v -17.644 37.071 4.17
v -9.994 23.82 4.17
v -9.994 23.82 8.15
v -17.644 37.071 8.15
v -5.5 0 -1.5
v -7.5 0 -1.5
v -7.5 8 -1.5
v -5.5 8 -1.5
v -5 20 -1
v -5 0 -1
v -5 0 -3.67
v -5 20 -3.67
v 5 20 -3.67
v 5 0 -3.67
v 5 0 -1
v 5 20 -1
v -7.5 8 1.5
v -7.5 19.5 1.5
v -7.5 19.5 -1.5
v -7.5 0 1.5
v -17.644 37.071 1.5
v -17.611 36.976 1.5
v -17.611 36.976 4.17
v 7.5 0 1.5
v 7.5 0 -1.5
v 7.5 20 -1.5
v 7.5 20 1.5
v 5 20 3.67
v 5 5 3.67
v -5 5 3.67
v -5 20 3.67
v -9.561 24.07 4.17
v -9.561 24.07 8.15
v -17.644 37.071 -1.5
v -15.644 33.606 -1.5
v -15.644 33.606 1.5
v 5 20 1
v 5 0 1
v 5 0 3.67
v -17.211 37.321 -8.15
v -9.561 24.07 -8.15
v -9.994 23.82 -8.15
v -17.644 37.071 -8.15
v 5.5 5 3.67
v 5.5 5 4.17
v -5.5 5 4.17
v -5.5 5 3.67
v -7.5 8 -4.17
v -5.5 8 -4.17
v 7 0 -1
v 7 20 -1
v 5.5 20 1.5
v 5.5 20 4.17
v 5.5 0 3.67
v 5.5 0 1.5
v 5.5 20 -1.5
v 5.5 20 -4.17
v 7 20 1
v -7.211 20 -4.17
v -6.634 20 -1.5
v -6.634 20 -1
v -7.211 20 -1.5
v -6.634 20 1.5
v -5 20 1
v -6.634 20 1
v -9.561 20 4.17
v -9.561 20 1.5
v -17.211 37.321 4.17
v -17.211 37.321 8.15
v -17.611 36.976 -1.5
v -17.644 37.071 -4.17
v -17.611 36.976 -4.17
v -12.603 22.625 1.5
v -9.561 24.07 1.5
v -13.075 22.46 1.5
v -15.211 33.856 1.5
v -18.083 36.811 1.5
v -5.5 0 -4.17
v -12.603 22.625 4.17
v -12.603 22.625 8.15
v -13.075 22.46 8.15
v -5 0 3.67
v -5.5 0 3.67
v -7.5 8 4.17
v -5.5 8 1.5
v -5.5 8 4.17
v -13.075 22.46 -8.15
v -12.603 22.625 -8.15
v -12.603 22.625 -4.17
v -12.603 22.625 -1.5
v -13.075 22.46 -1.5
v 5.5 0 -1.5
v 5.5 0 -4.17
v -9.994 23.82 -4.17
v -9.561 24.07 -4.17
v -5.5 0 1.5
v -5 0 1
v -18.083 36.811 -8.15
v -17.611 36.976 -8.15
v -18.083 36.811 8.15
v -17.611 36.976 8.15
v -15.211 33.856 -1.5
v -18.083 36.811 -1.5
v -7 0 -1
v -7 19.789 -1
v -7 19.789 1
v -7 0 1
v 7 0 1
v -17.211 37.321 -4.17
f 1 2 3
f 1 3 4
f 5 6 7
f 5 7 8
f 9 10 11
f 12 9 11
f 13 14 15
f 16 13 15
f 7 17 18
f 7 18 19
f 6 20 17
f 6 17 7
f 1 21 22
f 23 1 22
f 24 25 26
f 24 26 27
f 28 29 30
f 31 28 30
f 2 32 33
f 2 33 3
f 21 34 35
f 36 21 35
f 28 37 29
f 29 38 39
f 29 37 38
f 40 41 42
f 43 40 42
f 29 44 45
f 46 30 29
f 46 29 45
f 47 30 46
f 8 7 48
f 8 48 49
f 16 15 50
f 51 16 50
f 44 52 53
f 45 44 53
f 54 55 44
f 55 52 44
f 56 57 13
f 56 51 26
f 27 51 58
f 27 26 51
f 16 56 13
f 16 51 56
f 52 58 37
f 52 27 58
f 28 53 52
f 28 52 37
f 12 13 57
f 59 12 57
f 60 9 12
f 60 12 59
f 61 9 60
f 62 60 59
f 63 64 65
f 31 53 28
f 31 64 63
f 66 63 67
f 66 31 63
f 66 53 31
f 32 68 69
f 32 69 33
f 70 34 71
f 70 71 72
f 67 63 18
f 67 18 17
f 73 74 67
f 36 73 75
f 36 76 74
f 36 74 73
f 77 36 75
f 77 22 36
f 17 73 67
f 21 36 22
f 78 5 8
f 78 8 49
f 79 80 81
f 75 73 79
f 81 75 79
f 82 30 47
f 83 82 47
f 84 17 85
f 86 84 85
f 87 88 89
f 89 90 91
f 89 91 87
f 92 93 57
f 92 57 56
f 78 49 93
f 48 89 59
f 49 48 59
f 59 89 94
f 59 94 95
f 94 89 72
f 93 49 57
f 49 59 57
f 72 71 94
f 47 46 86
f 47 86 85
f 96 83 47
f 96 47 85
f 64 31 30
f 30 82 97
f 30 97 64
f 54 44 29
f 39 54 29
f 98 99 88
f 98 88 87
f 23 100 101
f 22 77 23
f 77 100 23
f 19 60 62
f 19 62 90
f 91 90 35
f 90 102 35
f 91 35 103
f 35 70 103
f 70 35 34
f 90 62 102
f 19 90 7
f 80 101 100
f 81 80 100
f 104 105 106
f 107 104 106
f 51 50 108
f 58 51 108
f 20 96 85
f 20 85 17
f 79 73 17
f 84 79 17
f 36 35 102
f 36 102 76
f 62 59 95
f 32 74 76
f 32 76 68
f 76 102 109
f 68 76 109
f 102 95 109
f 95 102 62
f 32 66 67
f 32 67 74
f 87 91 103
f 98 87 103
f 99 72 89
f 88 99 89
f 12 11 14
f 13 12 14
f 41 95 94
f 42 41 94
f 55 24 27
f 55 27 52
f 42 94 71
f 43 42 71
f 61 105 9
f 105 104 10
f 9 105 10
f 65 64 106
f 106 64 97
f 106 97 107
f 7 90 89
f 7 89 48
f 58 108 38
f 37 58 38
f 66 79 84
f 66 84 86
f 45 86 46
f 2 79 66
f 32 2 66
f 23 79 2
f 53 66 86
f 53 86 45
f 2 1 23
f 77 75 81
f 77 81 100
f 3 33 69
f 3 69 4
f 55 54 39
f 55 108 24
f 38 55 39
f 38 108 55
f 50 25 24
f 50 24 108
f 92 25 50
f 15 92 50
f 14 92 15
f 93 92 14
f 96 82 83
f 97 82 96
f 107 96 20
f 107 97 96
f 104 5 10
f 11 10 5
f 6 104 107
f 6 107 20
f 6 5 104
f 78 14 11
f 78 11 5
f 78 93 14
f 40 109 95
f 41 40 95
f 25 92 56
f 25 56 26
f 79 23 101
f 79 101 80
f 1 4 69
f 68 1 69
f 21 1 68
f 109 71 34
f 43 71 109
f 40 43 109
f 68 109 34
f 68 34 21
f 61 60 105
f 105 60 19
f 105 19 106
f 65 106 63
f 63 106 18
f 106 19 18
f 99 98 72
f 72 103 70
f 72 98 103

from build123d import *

# Parameters (mm, degrees)
AUFSATZ_LINEAR_AUSTRAGEN1_DEPTH  = 20
SCHNITT_LINEAR_AUSTRAGEN2_REACH  = 2.5
SKIZZE8_W                        = 11
SKIZZE8_H                        = 5
AUFSATZ_LINEAR_AUSTRAGEN3_DEPTH  = 8.34
SCHNITT_LINEAR_AUSTRAGEN3_REACH  = 19.821
SKIZZE12_W                       = 1.5
SKIZZE12_H                       = 2
AUFSATZ_LINEAR_AUSTRAGEN4_DEPTH  = 3.98
AUFSATZ_LINEAR_AUSTRAGEN5_DEPTH  = 2.67
AUFSATZ_LINEAR_AUSTRAGEN6_DEPTH  = 2.67
SCHNITT_LINEAR_AUSTRAGEN4_REACH  = 23.901
SKIZZE17_W                       = 3
SKIZZE17_H                       = 16.288675134
AUFSATZ_LINEAR_AUSTRAGEN15_DEPTH = 6.65
SCHNITT_LINEAR_AUSTRAGEN5_REACH  = 14.32


with BuildPart() as part:
    # Skizze1 → Aufsatz-Linear austragen1 (new body)
    with BuildSketch(Plane(origin=(0, 0, 0), x_dir=(1, 0, 0), z_dir=(0, 1, 0))):
        Polygon((5.5, -4.17), (-5.5, -4.17), (-5.5, -1.5), (-7.5, -1.5), (-7.5, 1.5), (-5.5, 1.5), (-5.5, 4.17), (5.5, 4.17), (5.5, 1.5), (7.5, 1.5), (7.5, -1.5), (5.5, -1.5), align=None)
        Polygon((-5, 1), (-5, 3.67), (5, 3.67), (5, 1), (7, 1), (7, -1), (5, -1), (5, -3.67), (-5, -3.67), (-5, -1), (-7, -1), (-7, 1), align=None, mode=Mode.SUBTRACT)
    extrude(amount=AUFSATZ_LINEAR_AUSTRAGEN1_DEPTH)

    # Skizze8 → Schnitt-Linear austragen2 (cut, up to next)
    with BuildSketch(Plane(origin=(0, 0, 3.67), x_dir=(-1, 0, 0), z_dir=(0, 0, -1)), mode=Mode.PRIVATE) as schnitt_linear_austragen2_sk1:
        with Locations((0, 2.5)):
            Rectangle(SKIZZE8_W, SKIZZE8_H)
    schnitt_linear_austragen2_tool1 = extrude(schnitt_linear_austragen2_sk1.sketch, amount=-SCHNITT_LINEAR_AUSTRAGEN2_REACH, mode=Mode.PRIVATE) & part.part
    add(schnitt_linear_austragen2_tool1.solids().sort_by_distance((0, 2.5, 3.67))[0], mode=Mode.SUBTRACT)

    # Skizze10 → Aufsatz-Linear austragen3 (add)
    with BuildSketch(Plane(origin=(0, 0, -4.17), x_dir=(-1, 0, 0), z_dir=(0, 0, -1))):
        Polygon((5.5, 20), (7.211324865, 20), (17.211324865, 37.320508076), (17.644337567, 37.070508076), (7.5, 19.5), (5.5, 19.5), align=None)
    extrude(amount=-AUFSATZ_LINEAR_AUSTRAGEN3_DEPTH)

    # Skizze12 → Schnitt-Linear austragen3 (cut, up to next)
    with BuildSketch(Plane.XZ.offset(-19.5), mode=Mode.PRIVATE) as schnitt_linear_austragen3_sk1:
        with Locations((-6.25, 0)):
            Rectangle(SKIZZE12_W, SKIZZE12_H)
    schnitt_linear_austragen3_tool1 = extrude(schnitt_linear_austragen3_sk1.sketch, amount=-SCHNITT_LINEAR_AUSTRAGEN3_REACH, mode=Mode.PRIVATE) & part.part
    add(schnitt_linear_austragen3_tool1.solids().sort_by_distance((-6.25, 19.5, 0))[0], mode=Mode.SUBTRACT)

    # Skizze13 → Aufsatz-Linear austragen4 (add)
    with BuildSketch(Plane(origin=(0, 0, -4.17), x_dir=(-1, 0, 0), z_dir=(0, 0, -1))):
        Polygon((17.211324865, 37.320508076), (9.561324865, 24.070319398), (9.994337567, 23.820319398), (17.644337567, 37.070508076), align=None)
    aufsatz_linear_austragen4 = extrude(amount=AUFSATZ_LINEAR_AUSTRAGEN4_DEPTH)

    # Skizze15 → Aufsatz-Linear austragen5 (add)
    with BuildSketch(Plane(origin=(0, 0, -1.5), x_dir=(-1, 0, 0), z_dir=(0, 0, -1))):
        Polygon((5.5, 8), (5.5, 19.5), (7.5, 19.5), (17.644337567, 37.070508076), (7.5, 8), align=None)
    extrude(amount=AUFSATZ_LINEAR_AUSTRAGEN5_DEPTH)

    # Spiegeln1: Aufsatz-Linear austragen4 across plane
    add(aufsatz_linear_austragen4.mirror(Plane.XY))

    # Skizze16 → Aufsatz-Linear austragen6 (add)
    with BuildSketch(Plane.XY.offset(1.5)):
        Polygon((-17.644337567, 37.070508076), (-7.5, 8), (-5.5, 8), (-5.5, 19.5), (-7.5, 19.5), align=None)
    extrude(amount=AUFSATZ_LINEAR_AUSTRAGEN6_DEPTH)

    # Skizze17 → Schnitt-Linear austragen4 (cut, up to next)
    with BuildSketch(Plane(origin=(2.818747687, 1.627404736, 0), x_dir=(0, 0, 1), z_dir=(-0.866025404, -0.5, 0)), mode=Mode.PRIVATE) as schnitt_linear_austragen4_sk1:
        with Locations((0, 28.781832941)):
            Rectangle(SKIZZE17_W, SKIZZE17_H)
    schnitt_linear_austragen4_tool1 = extrude(schnitt_linear_austragen4_sk1.sketch, amount=-SCHNITT_LINEAR_AUSTRAGEN4_REACH, mode=Mode.PRIVATE) & part.part
    add(schnitt_linear_austragen4_tool1.solids().sort_by_distance((-11.572169, 26.553203, 0))[0], mode=Mode.SUBTRACT)

    # Skizze22 → Aufsatz-Linear austragen15 (add)
    with BuildSketch(Plane.XY.offset(-1.5)):
        Polygon((-17.611390326, 36.976091556), (-12.603409607, 22.624780496), (-13.075492208, 22.460044288), (-18.083472926, 36.811355348), align=None)
    aufsatz_linear_austragen15 = extrude(amount=-AUFSATZ_LINEAR_AUSTRAGEN15_DEPTH)

    # Spiegeln2: Aufsatz-Linear austragen15 across plane
    add(aufsatz_linear_austragen15.mirror(Plane.XY))

    # Skizze23 → Schnitt-Linear austragen5 (cut, up to next)
    with BuildSketch(Plane.XY.offset(4.17), mode=Mode.PRIVATE) as schnitt_linear_austragen5_sk1:
        Polygon((-7.211324865, 20), (-9.561324865, 20), (-9.561324865, 24.070319398), align=None)
    schnitt_linear_austragen5_tool1 = extrude(schnitt_linear_austragen5_sk1.sketch, amount=-SCHNITT_LINEAR_AUSTRAGEN5_REACH, mode=Mode.PRIVATE) & part.part
    add(schnitt_linear_austragen5_tool1.solids().sort_by_distance((-8.777992, 21.356773, 4.17))[0], mode=Mode.SUBTRACT)


solid = part.part
